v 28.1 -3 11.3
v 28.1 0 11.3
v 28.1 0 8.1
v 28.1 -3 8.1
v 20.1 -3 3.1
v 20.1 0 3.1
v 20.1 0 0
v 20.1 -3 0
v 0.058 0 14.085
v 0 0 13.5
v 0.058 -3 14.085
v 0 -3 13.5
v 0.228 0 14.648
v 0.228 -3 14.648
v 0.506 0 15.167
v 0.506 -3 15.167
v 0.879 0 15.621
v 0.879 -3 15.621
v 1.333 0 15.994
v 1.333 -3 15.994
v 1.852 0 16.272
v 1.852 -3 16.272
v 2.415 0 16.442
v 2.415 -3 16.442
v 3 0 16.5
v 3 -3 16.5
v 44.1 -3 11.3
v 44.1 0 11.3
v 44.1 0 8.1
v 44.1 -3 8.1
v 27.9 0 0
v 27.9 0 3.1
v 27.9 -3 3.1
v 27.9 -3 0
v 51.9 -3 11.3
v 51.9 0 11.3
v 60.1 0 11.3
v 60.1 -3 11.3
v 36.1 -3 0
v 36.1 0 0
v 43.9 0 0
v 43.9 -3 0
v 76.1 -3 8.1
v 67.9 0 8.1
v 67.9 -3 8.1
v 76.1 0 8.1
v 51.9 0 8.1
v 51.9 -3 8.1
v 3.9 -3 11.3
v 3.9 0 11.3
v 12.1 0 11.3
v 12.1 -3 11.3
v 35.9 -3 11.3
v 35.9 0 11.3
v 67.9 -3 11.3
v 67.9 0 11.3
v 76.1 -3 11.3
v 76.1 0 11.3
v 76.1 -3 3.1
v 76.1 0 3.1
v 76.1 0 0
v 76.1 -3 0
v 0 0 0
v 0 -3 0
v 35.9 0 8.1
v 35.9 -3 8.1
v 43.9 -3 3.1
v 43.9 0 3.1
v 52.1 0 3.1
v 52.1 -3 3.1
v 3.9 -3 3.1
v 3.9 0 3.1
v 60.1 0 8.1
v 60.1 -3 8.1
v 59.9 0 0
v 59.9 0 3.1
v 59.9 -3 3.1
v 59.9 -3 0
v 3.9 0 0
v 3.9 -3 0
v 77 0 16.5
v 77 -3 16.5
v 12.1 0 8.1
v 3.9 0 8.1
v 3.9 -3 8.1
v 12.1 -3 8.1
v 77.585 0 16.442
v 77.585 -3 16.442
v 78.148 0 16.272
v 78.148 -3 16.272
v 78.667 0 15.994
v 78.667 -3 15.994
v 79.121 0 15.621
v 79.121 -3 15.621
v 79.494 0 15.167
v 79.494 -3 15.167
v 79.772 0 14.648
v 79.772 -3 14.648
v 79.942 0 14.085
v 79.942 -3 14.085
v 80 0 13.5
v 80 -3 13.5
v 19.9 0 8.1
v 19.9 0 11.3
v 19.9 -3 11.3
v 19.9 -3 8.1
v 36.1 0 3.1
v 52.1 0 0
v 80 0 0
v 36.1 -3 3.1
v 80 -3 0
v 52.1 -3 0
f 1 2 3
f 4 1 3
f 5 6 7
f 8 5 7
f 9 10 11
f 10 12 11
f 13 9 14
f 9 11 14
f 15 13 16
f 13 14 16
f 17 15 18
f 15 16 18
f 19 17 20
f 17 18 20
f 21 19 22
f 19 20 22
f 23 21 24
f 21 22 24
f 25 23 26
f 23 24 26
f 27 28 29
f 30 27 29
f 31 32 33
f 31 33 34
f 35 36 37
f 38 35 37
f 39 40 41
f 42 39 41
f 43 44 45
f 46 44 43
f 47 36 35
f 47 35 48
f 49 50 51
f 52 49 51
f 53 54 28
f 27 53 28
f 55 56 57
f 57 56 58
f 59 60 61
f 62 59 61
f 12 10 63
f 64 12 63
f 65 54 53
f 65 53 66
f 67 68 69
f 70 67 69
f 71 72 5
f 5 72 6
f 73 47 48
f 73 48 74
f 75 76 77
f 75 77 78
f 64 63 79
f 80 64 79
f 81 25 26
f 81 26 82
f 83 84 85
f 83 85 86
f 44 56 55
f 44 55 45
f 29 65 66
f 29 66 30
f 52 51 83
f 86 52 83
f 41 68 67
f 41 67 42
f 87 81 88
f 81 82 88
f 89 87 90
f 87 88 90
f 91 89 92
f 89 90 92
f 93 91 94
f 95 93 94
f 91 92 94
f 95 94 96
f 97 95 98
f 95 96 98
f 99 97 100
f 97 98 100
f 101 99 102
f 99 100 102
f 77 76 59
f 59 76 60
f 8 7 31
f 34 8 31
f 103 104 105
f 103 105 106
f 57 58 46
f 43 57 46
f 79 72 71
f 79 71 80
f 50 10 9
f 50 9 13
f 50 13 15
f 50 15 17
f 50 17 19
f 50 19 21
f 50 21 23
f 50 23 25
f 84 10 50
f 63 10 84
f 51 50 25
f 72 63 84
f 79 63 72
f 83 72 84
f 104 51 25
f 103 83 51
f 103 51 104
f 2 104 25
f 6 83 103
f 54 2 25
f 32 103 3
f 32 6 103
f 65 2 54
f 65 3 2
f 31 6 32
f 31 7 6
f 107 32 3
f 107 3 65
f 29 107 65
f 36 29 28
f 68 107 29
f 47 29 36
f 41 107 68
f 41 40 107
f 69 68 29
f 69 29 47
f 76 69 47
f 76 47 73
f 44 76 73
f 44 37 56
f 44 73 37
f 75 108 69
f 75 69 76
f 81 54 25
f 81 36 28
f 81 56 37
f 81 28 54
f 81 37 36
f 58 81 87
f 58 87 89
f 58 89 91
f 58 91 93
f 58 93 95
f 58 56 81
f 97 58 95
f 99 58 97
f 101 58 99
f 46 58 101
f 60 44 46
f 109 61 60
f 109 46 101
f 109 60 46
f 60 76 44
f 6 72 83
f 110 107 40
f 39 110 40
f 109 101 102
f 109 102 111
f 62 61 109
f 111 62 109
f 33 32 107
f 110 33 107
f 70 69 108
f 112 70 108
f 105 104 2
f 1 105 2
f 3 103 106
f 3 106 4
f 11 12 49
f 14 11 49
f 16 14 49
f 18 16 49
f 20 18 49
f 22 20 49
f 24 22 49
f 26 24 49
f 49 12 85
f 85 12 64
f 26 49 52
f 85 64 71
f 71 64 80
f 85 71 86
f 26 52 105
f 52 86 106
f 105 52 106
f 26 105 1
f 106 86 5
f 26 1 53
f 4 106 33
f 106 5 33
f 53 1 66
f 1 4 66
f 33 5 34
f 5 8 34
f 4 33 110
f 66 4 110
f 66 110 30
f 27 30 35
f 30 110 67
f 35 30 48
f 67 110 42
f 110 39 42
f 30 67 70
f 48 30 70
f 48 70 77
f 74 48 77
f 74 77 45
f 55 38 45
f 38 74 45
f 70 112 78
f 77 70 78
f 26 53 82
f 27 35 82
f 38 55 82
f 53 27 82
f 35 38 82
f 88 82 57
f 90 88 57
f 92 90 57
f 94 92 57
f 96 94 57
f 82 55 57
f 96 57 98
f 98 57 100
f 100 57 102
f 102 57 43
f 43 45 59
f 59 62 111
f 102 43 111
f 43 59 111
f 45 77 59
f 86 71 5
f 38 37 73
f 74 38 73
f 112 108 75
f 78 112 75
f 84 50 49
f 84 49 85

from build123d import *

# Parameters (mm, degrees)
SKETCH1_W           = 80
SKETCH1_H           = 16.5
BOSS_EXTRUDE1_DEPTH = 3
SKETCH3_W           = 8.2
SKETCH3_H           = 3.2
SKETCH3_W_2         = 16.2
CUT_EXTRUDE1_DEPTH  = 4
FILLET1_R           = 3


with BuildPart() as part:
    # Sketch1 → Boss-Extrude1 (new body)
    with BuildSketch(Plane(origin=(0, 0, 0), x_dir=(1, 0, 0), z_dir=(0, 1, 0))):
        with Locations((40, -8.25)):
            Rectangle(SKETCH1_W, SKETCH1_H)
    extrude(amount=-BOSS_EXTRUDE1_DEPTH)

    # Sketch3 → Cut-Extrude1 (cut, through all)
    with BuildSketch(Plane(origin=(0, 0, 0), x_dir=(1, 0, 0), z_dir=(0, 1, 0))):
        with Locations((8, -9.7)):
            Rectangle(SKETCH3_W, SKETCH3_H)
        with Locations((32, -1.5)):
            Rectangle(SKETCH3_W, SKETCH3_H)
        with Locations((40, -9.7)):
            Rectangle(SKETCH3_W, SKETCH3_H)
        with Locations((24, -9.7)):
            Rectangle(SKETCH3_W, SKETCH3_H)
        with Locations((12, -1.5)):
            Rectangle(SKETCH3_W_2, SKETCH3_H)
        with Locations((48, -1.5)):
            Rectangle(SKETCH3_W, SKETCH3_H)
        with Locations((56, -9.7)):
            Rectangle(SKETCH3_W, SKETCH3_H)
        with Locations((72, -9.7)):
            Rectangle(SKETCH3_W, SKETCH3_H)
        with Locations((68, -1.5)):
            Rectangle(SKETCH3_W_2, SKETCH3_H)
    extrude(amount=-CUT_EXTRUDE1_DEPTH, mode=Mode.SUBTRACT)

    # Fillet1
    fillet1_edges = [part.edges().sort_by_distance(p)[0] for p in [
        (80, -1.5, 16.5),
        (0, -1.5, 16.5),
    ]]
    fillet(fillet1_edges, radius=FILLET1_R)


solid = part.part
